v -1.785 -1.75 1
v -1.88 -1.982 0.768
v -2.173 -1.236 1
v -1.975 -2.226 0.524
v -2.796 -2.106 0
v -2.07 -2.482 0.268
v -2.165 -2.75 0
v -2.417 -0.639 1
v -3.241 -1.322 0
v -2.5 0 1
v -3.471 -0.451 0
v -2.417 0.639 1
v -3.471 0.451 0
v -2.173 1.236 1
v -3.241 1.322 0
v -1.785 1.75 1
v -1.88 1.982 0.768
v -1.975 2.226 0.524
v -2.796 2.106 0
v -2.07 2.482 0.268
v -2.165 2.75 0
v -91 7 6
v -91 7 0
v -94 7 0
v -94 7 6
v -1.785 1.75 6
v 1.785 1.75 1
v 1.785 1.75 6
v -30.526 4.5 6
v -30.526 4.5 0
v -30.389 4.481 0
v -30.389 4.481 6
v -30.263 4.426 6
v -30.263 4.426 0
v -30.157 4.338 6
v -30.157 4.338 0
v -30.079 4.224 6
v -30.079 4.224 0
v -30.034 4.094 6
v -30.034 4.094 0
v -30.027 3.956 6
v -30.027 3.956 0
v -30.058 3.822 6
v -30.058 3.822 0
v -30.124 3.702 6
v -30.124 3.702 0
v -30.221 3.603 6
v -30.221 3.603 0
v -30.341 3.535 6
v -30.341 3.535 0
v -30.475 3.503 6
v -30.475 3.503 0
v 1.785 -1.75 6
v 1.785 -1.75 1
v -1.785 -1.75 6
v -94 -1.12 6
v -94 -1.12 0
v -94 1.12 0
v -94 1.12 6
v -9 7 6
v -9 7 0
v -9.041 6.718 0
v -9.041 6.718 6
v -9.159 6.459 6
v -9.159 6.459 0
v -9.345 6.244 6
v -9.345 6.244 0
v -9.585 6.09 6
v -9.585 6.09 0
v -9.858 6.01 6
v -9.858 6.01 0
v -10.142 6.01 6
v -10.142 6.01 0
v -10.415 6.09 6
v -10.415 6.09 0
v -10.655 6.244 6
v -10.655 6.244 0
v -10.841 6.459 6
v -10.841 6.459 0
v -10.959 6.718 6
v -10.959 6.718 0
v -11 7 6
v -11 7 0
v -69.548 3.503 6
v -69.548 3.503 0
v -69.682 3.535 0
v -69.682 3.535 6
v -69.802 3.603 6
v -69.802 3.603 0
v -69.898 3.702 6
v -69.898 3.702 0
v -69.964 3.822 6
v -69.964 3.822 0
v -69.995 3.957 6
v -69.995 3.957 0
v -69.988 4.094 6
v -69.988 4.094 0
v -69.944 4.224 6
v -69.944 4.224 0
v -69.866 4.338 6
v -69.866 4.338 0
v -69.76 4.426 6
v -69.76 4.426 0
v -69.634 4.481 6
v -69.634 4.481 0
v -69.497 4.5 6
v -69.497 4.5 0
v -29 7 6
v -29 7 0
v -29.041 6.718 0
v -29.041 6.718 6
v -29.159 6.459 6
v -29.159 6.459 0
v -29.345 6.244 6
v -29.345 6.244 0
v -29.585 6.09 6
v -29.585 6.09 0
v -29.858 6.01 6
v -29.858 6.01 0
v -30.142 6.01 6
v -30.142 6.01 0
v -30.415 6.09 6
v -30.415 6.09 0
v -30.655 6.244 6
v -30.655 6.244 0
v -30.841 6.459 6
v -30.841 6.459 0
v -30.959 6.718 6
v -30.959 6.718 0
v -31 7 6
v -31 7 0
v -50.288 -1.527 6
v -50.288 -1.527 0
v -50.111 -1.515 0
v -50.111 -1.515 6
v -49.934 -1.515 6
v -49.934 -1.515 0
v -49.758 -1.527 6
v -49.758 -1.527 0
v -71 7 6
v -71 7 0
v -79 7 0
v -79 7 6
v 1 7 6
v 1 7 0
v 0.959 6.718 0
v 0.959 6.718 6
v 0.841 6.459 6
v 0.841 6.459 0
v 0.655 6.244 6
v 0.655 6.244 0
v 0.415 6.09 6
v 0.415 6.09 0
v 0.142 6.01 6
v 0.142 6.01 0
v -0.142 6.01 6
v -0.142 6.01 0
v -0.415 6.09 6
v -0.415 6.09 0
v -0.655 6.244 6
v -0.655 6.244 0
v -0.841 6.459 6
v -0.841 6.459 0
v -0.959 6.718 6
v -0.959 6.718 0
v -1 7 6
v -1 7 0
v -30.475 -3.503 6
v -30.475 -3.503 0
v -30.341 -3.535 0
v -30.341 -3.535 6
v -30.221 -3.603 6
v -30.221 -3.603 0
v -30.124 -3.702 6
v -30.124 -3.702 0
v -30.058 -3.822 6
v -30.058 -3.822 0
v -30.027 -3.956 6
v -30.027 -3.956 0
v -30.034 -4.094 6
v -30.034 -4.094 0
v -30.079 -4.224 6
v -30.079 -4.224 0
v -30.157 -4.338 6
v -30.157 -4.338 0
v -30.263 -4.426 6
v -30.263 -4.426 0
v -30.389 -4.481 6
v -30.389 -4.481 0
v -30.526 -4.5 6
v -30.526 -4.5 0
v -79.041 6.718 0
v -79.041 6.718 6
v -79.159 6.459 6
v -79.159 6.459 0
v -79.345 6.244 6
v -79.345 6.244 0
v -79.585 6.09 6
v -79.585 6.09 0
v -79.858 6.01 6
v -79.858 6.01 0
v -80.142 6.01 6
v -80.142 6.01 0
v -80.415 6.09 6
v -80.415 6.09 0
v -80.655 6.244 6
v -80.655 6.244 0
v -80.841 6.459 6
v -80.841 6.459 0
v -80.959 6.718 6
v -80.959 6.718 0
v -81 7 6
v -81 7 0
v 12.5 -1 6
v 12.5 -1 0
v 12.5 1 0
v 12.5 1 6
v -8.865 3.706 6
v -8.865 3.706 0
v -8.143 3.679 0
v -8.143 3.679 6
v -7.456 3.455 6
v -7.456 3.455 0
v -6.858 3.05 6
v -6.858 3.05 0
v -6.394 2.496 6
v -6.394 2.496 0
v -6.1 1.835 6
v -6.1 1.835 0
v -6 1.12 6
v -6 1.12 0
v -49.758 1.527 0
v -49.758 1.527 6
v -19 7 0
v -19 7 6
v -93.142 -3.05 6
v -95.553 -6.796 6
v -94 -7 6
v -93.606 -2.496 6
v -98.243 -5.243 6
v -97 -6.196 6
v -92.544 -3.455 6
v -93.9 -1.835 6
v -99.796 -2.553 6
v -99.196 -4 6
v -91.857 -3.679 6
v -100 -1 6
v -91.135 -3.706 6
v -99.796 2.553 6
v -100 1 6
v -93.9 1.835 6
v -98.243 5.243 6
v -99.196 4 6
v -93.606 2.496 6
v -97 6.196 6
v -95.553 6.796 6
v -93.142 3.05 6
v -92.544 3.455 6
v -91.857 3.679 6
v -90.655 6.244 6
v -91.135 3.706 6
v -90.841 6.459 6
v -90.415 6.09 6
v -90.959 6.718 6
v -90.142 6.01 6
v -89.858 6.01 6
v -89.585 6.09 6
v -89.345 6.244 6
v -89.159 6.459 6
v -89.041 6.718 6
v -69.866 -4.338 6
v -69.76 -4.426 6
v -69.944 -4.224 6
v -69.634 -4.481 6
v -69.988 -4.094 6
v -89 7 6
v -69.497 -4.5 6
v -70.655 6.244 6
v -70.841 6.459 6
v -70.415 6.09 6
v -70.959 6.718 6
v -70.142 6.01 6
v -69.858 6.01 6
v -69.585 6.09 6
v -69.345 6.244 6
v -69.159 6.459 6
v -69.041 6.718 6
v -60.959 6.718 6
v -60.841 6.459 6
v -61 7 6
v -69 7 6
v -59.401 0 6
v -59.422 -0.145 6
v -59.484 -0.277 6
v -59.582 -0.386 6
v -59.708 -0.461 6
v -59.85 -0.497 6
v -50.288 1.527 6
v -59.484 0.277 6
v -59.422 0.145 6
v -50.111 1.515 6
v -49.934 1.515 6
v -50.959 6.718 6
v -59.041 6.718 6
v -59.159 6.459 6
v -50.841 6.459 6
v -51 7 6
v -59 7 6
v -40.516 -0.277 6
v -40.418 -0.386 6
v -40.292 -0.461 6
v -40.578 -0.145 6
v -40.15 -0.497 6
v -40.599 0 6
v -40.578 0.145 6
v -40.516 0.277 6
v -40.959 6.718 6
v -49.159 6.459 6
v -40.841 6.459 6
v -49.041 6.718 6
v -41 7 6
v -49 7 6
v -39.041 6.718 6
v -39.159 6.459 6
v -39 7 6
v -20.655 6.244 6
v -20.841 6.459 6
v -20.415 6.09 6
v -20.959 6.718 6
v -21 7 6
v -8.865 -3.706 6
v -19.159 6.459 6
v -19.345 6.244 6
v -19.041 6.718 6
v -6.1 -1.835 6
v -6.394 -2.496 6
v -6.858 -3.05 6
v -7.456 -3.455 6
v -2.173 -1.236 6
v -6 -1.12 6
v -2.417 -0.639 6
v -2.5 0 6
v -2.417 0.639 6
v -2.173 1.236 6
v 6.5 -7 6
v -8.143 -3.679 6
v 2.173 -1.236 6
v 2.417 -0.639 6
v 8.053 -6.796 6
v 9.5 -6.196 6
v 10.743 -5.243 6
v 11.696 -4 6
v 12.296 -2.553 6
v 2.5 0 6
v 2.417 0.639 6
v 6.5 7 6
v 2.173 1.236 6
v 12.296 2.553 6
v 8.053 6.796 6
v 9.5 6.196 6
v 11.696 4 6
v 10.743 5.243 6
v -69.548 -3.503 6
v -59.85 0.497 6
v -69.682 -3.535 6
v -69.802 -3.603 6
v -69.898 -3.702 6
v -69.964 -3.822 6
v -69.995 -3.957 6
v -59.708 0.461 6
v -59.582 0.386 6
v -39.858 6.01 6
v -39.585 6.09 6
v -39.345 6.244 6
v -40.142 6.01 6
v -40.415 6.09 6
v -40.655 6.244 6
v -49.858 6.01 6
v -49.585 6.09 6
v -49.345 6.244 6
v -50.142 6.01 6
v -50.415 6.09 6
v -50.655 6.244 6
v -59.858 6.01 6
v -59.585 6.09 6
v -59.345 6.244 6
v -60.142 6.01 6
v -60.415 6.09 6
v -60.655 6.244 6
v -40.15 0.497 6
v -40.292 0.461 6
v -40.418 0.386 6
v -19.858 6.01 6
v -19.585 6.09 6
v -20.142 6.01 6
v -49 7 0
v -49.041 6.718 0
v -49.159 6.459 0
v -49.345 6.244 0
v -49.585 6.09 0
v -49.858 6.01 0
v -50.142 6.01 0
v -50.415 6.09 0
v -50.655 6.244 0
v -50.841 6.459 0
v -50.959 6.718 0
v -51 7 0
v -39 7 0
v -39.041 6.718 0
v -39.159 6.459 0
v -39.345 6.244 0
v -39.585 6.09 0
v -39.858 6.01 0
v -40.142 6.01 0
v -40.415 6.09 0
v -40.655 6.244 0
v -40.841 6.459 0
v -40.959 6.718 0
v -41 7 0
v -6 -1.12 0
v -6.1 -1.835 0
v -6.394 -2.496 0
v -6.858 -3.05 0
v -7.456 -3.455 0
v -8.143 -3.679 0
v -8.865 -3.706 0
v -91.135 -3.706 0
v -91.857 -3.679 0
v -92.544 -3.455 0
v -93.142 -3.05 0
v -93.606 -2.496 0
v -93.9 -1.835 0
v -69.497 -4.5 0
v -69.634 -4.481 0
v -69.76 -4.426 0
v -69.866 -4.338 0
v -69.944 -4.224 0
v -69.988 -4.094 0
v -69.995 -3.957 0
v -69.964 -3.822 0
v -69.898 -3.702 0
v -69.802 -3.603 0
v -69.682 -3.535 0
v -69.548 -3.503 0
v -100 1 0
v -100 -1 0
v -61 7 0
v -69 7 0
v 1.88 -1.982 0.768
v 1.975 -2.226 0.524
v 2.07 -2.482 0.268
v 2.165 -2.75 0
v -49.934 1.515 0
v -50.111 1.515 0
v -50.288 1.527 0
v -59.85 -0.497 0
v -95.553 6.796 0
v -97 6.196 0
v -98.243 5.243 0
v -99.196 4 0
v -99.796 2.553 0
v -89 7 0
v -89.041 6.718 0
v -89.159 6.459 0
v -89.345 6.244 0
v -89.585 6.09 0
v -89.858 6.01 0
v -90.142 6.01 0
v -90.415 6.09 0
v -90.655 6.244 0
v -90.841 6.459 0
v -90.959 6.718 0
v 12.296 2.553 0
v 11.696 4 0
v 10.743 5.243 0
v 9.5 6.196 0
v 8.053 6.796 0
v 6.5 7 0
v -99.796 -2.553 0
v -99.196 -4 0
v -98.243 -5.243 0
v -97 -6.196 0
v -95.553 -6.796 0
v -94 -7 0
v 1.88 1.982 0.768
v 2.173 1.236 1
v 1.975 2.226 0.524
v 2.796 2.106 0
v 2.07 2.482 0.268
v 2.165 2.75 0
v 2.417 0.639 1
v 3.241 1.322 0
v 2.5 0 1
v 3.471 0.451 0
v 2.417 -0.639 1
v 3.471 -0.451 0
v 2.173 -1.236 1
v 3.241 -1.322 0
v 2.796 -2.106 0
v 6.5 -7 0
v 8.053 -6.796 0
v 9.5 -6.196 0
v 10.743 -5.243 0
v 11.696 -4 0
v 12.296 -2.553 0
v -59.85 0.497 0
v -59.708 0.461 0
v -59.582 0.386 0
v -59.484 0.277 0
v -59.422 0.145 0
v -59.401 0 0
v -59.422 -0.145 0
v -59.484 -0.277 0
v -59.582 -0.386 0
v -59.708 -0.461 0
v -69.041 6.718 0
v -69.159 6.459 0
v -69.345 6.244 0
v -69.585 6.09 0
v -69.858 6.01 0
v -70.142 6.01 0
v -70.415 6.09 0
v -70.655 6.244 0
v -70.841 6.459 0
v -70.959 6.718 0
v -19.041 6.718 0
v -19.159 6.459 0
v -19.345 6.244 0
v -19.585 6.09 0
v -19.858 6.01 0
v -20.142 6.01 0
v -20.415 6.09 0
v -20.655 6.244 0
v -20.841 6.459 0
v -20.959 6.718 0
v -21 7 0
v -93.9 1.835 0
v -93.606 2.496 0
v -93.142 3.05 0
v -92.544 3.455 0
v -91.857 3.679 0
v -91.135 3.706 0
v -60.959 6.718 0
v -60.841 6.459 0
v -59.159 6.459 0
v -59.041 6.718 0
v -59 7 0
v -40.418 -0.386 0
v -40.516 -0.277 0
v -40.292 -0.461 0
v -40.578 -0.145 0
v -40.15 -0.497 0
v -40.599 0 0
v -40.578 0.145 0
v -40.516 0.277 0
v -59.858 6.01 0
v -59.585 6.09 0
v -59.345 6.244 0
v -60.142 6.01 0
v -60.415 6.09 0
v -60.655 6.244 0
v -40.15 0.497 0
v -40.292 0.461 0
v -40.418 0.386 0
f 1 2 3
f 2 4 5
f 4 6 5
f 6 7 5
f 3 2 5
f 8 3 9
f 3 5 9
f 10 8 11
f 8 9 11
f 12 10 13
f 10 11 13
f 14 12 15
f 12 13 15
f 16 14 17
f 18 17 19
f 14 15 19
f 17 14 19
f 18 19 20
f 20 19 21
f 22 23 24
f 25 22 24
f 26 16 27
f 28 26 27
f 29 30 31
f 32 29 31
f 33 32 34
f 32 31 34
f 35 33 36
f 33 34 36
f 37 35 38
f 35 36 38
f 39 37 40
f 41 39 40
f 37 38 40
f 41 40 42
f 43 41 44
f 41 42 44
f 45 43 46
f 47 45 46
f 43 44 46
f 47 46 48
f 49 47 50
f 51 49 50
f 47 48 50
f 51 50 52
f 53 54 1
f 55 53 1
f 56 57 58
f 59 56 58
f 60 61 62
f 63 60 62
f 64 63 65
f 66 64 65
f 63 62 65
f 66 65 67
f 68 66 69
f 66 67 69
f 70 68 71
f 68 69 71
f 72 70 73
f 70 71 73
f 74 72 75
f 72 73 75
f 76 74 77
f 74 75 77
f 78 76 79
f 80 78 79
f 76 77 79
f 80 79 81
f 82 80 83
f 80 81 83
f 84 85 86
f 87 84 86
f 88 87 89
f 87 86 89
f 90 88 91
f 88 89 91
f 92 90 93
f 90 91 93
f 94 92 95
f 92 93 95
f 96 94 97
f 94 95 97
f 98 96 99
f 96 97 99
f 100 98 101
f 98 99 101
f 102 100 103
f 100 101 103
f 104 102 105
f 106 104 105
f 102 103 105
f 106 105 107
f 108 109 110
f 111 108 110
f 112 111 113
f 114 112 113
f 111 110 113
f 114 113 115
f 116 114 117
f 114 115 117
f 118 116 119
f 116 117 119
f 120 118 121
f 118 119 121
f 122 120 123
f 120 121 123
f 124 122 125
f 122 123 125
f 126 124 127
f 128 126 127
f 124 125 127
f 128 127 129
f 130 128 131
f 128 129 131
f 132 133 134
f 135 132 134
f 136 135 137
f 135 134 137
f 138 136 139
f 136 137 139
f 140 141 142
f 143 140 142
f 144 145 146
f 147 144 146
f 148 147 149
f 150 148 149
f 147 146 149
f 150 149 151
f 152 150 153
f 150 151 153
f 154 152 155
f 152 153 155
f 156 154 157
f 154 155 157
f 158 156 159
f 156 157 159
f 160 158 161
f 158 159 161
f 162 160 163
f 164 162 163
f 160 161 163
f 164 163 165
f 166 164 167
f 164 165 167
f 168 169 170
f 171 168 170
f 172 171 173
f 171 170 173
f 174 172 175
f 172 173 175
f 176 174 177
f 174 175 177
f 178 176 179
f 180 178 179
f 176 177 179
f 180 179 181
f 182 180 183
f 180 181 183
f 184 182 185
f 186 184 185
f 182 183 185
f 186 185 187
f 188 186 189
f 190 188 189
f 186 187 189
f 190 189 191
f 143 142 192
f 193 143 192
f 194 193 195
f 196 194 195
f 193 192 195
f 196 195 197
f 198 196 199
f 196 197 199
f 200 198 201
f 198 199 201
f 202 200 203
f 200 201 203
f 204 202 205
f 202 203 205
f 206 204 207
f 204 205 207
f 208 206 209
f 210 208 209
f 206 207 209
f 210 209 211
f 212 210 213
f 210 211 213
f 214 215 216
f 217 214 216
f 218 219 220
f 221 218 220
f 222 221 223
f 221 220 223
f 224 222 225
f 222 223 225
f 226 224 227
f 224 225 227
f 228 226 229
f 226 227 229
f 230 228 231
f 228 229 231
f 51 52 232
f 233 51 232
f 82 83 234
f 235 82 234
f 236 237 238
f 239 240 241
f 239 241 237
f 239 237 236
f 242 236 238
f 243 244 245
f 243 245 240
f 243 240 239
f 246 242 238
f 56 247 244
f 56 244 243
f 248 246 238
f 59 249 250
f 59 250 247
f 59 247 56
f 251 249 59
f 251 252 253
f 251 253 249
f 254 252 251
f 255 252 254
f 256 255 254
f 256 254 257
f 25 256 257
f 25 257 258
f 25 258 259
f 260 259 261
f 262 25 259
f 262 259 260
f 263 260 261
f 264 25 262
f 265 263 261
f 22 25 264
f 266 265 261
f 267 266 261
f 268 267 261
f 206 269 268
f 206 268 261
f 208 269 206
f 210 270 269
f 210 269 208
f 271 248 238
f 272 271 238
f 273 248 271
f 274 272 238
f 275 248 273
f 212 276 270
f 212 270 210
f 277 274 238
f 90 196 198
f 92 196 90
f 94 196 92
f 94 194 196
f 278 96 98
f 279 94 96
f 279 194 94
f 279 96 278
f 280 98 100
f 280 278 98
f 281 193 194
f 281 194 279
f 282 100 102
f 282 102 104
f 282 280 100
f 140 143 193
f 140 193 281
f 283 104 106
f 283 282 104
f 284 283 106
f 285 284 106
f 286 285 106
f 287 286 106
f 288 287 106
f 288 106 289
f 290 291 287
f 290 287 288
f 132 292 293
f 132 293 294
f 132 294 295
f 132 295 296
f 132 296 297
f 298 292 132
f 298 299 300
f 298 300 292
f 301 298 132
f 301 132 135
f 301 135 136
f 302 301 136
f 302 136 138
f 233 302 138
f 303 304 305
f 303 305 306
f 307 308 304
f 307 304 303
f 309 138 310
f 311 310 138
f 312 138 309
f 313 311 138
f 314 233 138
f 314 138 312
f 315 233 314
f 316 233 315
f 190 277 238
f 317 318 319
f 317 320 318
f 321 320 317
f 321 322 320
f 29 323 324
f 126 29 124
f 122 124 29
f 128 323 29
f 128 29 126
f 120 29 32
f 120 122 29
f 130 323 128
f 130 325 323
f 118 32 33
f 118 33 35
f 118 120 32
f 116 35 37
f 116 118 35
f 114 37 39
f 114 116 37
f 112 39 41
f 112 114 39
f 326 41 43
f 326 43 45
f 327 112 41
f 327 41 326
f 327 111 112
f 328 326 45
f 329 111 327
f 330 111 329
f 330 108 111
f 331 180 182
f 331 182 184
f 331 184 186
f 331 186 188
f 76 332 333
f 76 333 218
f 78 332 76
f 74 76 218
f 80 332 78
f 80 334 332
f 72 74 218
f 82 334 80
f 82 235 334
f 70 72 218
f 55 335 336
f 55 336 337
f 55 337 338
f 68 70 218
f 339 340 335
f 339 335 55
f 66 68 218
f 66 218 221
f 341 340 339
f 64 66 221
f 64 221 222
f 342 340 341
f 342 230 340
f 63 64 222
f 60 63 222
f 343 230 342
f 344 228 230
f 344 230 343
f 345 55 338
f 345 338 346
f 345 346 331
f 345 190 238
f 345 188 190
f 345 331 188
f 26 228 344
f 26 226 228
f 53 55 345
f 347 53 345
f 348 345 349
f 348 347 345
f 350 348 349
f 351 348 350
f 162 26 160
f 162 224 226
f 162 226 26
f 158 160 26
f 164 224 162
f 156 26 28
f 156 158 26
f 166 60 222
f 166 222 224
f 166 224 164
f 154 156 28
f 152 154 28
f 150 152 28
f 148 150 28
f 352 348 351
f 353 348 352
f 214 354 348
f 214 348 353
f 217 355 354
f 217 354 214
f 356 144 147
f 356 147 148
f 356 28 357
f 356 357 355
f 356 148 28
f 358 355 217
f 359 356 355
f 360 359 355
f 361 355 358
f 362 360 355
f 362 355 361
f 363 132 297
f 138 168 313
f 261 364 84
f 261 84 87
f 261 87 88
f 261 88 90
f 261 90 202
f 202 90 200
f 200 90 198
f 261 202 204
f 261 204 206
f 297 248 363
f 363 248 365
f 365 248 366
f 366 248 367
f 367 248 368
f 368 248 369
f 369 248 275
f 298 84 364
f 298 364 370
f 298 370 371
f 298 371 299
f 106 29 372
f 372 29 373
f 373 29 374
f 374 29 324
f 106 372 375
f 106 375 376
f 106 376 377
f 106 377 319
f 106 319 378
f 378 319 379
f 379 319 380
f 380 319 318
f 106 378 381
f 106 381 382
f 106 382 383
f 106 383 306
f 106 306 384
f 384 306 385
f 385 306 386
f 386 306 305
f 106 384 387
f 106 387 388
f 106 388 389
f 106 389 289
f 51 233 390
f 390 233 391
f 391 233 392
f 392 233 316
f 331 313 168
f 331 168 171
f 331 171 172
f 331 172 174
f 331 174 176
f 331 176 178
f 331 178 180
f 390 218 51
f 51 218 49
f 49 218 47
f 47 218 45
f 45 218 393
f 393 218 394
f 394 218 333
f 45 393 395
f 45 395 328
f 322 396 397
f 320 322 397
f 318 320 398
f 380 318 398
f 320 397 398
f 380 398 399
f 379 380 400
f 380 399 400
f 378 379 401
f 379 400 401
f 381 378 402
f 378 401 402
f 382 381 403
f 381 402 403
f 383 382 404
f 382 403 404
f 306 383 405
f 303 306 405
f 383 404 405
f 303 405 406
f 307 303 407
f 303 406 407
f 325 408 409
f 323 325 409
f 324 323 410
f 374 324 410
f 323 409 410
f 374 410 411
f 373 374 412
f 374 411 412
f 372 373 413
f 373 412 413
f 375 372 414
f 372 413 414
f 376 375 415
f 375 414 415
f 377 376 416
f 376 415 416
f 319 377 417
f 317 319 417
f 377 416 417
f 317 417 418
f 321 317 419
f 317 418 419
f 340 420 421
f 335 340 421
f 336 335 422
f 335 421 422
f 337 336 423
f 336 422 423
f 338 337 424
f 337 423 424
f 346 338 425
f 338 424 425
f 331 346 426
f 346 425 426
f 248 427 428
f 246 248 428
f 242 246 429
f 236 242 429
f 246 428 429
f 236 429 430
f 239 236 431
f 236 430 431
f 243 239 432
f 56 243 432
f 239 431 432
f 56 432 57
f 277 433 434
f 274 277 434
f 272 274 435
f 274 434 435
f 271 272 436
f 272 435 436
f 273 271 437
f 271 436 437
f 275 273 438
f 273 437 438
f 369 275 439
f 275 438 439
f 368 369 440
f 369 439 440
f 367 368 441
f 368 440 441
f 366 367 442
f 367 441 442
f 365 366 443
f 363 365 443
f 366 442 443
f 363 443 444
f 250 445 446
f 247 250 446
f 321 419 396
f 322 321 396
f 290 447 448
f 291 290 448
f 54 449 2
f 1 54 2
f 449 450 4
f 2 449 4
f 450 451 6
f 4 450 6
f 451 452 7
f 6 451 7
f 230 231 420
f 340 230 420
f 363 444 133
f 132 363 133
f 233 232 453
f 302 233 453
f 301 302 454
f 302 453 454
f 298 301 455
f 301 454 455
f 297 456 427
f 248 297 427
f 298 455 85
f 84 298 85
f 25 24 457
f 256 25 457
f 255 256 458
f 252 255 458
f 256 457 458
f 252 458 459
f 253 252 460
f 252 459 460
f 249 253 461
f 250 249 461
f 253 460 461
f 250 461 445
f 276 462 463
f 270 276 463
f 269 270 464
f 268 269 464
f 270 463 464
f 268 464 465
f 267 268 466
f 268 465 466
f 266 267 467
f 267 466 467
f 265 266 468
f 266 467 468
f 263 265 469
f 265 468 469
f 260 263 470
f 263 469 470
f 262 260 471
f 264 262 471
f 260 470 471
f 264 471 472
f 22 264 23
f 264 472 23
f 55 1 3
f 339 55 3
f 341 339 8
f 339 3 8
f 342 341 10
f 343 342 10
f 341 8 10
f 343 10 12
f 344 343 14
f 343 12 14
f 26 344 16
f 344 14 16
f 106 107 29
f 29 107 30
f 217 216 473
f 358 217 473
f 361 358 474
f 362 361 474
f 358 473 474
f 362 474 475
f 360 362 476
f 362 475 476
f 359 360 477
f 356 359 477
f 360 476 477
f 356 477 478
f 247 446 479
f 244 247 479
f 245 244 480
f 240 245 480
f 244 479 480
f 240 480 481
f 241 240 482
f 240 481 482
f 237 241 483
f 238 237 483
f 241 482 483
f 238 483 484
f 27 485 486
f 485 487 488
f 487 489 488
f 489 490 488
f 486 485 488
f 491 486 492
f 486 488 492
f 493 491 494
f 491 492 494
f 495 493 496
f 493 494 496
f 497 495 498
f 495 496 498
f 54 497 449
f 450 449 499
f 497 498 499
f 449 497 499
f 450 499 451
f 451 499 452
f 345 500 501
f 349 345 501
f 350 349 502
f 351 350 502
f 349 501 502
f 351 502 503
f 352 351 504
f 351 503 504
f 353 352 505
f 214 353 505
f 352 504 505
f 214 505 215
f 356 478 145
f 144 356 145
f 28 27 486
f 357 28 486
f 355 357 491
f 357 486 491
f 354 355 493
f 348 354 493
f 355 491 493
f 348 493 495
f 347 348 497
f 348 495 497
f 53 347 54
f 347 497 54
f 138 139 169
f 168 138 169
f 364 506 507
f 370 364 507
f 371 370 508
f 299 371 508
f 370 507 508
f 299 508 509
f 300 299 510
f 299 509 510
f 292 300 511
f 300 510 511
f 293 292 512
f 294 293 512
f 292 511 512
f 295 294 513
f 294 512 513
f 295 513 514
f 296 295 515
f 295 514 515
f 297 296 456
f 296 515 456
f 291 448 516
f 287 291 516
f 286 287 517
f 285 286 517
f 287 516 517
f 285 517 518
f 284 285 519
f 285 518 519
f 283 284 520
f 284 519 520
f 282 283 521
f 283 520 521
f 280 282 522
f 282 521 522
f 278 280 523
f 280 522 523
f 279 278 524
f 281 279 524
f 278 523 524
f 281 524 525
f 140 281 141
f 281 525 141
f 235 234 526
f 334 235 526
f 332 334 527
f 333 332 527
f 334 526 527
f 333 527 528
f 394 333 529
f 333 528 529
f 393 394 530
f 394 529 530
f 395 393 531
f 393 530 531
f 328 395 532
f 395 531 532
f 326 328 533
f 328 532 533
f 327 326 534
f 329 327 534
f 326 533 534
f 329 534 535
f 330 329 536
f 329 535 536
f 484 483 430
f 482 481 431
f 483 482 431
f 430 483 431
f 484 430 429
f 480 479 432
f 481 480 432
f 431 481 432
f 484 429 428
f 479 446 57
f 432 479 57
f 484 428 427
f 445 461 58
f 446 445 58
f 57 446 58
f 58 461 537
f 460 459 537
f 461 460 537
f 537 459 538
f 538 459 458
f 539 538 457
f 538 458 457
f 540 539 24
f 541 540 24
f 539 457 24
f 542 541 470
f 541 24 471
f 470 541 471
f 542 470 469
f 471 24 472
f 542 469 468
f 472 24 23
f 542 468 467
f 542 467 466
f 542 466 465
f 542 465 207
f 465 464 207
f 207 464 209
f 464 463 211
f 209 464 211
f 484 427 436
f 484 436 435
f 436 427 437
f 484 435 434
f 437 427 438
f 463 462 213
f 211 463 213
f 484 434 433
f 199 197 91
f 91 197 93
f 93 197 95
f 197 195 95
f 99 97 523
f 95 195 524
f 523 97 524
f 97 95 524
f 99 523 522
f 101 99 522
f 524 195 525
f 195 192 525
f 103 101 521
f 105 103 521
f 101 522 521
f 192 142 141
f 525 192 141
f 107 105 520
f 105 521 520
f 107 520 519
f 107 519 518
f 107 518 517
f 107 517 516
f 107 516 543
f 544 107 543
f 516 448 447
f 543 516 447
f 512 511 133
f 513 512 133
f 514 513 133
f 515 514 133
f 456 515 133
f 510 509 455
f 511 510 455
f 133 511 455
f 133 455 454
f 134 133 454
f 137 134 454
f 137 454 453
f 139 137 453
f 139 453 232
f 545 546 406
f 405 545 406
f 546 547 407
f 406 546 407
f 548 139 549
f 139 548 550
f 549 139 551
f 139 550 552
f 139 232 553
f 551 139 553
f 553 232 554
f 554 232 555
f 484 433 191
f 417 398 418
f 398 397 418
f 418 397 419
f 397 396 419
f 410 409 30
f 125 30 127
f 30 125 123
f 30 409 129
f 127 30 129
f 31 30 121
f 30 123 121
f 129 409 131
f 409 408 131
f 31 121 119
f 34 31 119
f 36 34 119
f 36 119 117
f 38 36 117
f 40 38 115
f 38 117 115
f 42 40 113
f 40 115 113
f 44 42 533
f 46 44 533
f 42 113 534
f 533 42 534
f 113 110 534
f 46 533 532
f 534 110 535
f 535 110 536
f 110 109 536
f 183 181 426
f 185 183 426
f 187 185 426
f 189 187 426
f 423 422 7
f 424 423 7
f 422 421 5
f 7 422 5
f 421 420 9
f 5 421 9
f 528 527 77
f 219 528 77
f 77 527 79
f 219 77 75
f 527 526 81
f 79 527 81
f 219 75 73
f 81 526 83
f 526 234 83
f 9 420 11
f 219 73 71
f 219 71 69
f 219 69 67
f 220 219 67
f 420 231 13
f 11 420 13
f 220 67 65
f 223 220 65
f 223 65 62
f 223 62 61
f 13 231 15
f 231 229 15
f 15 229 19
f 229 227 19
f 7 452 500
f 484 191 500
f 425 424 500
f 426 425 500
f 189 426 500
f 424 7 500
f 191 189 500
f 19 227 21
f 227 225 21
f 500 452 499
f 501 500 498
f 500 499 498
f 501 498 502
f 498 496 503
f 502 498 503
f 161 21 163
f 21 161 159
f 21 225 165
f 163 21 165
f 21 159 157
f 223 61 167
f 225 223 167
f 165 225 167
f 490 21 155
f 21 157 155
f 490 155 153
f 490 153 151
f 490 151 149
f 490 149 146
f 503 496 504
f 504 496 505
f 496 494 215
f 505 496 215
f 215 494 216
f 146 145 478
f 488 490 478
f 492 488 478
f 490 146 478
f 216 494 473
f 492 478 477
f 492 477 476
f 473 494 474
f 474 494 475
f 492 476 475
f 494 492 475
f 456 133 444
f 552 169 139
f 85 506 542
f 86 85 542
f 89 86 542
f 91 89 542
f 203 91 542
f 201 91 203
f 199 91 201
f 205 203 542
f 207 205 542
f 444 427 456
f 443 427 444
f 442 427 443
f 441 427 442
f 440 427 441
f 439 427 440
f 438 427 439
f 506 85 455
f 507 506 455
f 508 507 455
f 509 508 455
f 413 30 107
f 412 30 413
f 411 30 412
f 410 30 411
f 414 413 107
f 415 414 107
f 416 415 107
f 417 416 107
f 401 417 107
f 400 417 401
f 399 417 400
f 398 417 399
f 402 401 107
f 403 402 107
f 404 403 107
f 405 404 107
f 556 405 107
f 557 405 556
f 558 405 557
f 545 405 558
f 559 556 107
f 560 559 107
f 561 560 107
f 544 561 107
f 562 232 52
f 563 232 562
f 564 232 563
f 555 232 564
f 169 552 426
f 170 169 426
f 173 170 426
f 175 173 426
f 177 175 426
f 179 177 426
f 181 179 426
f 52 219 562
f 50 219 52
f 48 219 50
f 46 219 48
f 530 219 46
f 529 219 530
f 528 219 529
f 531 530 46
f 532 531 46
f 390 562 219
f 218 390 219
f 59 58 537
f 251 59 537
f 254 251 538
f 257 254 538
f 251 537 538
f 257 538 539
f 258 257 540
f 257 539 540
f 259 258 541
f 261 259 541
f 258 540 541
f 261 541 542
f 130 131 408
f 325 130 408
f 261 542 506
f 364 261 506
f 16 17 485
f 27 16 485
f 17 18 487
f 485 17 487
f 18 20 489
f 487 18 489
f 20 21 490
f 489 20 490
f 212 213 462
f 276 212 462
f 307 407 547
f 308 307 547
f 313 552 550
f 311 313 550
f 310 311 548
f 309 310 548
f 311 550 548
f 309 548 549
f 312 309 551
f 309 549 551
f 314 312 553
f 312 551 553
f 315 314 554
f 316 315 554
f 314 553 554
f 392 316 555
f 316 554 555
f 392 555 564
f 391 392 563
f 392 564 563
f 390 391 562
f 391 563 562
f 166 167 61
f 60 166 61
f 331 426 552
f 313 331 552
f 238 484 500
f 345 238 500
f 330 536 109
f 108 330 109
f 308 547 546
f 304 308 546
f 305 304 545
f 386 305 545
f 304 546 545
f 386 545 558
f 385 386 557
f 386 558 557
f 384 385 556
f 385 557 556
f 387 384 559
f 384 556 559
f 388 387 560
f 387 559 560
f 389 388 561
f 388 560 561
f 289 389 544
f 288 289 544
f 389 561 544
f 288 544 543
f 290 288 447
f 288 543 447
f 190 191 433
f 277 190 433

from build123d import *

# Parameters (mm, degrees)
F1_DEPTH = 6
F2_SIZE  = 1


with BuildPart() as f1:
    # F0 (on Top) → F1 (new body)
    with BuildSketch(Plane.XY):
        with BuildLine():
            Line((-91, 7), (-94, 7))
            ThreePointArc((-94, 7), (-98.242641, 5.242641), (-100, 1))
            Line((-100, 1), (-100, -1))
            ThreePointArc((-100, -1), (-98.242641, -5.242641), (-94, -7))
            Line((-94, -7), (6.5, -7))
            ThreePointArc((6.5, -7), (10.742641, -5.242641), (12.5, -1))
            Line((12.5, -1), (12.5, 1))
            ThreePointArc((12.5, 1), (10.742641, 5.242641), (6.5, 7))
            Line((6.5, 7), (1, 7))
            ThreePointArc((1, 7), (0, 6), (-1, 7))
            Line((-1, 7), (-9, 7))
            ThreePointArc((-9, 7), (-10, 6), (-11, 7))
            Line((-11, 7), (-19, 7))
            ThreePointArc((-19, 7), (-20, 6), (-21, 7))
            Line((-21, 7), (-29, 7))
            ThreePointArc((-29, 7), (-30, 6), (-31, 7))
            Line((-31, 7), (-39, 7))
            ThreePointArc((-39, 7), (-40, 6), (-41, 7))
            Line((-41, 7), (-49, 7))
            ThreePointArc((-49, 7), (-50, 6), (-51, 7))
            Line((-51, 7), (-59, 7))
            ThreePointArc((-59, 7), (-60, 6), (-61, 7))
            Line((-61, 7), (-69, 7))
            ThreePointArc((-69, 7), (-70, 6), (-71, 7))
            Line((-71, 7), (-79, 7))
            ThreePointArc((-79, 7), (-80, 6), (-81, 7))
            Line((-81, 7), (-89, 7))
            ThreePointArc((-89, 7), (-90, 6), (-91, 7))
        make_face()
        with BuildLine():
            ThreePointArc((-69.49713, -4.5), (-69.996478, -4.025541), (-69.548145, -3.502609))
            Line((-69.548145, -3.502609), (-50.287825, -1.527192))
            ThreePointArc((-50.287825, -1.527192), (-50.022703, -1.513624), (-49.75758, -1.527161))
            Line((-49.75758, -1.527161), (-30.474618, -3.502603))
            ThreePointArc((-30.474618, -3.502603), (-30.026225, -4.025511), (-30.525574, -4.5))
            Line((-30.525574, -4.5), (-69.49713, -4.5))
        make_face(mode=Mode.SUBTRACT)
        with BuildLine():
            Line((-94, -1.119694), (-94, 1.119694))
            ThreePointArc((-94, 1.119694), (-93.142166, 3.049683), (-91.134725, 3.706126))
            Line((-91.134725, 3.706126), (-59.84956, 0.497391))
            ThreePointArc((-59.84956, 0.497391), (-59.400574, 0), (-59.84956, -0.497391))
            Line((-59.84956, -0.497391), (-91.134725, -3.706126))
            ThreePointArc((-91.134725, -3.706126), (-93.142166, -3.049683), (-94, -1.119694))
        make_face(mode=Mode.SUBTRACT)
        with BuildLine():
            ThreePointArc((-69.548145, 3.502609), (-69.996478, 4.025541), (-69.49713, 4.5))
            Line((-69.49713, 4.5), (-30.525574, 4.5))
            ThreePointArc((-30.525574, 4.5), (-30.026225, 4.025511), (-30.474618, 3.502603))
            Line((-30.474618, 3.502603), (-49.75758, 1.527161))
            ThreePointArc((-49.75758, 1.527161), (-50.022703, 1.513624), (-50.287825, 1.527192))
            Line((-50.287825, 1.527192), (-69.548145, 3.502609))
        make_face(mode=Mode.SUBTRACT)
        with BuildLine():
            ThreePointArc((-40.15044, -0.497391), (-40.599426, 0), (-40.15044, 0.497391))
            Line((-40.15044, 0.497391), (-8.865275, 3.706126))
            ThreePointArc((-8.865275, 3.706126), (-6.857834, 3.049683), (-6, 1.119694))
            Line((-6, 1.119694), (-6, -1.119694))
            ThreePointArc((-6, -1.119694), (-6.857834, -3.049683), (-8.865275, -3.706126))
            Line((-8.865275, -3.706126), (-40.15044, -0.497391))
        make_face(mode=Mode.SUBTRACT)
        with BuildLine():
            ThreePointArc((-1.785357, -1.75), (-2.5, 0), (-1.785357, 1.75))
            Line((-1.785357, 1.75), (1.785357, 1.75))
            ThreePointArc((1.785357, 1.75), (2.5, 0), (1.785357, -1.75))
            Line((1.785357, -1.75), (-1.785357, -1.75))
        make_face(mode=Mode.SUBTRACT)
    extrude(amount=F1_DEPTH)

    # F2
    f2_edges = [f1.edges().sort_by_distance(p)[0] for p in [
        (0, 1.75, 0),
        (-2.5, 0, 0),
        (2.5, 0, 0),
        (0, -1.75, 0),
    ]]
    chamfer(f2_edges, length=F2_SIZE)


solid = f1.part
